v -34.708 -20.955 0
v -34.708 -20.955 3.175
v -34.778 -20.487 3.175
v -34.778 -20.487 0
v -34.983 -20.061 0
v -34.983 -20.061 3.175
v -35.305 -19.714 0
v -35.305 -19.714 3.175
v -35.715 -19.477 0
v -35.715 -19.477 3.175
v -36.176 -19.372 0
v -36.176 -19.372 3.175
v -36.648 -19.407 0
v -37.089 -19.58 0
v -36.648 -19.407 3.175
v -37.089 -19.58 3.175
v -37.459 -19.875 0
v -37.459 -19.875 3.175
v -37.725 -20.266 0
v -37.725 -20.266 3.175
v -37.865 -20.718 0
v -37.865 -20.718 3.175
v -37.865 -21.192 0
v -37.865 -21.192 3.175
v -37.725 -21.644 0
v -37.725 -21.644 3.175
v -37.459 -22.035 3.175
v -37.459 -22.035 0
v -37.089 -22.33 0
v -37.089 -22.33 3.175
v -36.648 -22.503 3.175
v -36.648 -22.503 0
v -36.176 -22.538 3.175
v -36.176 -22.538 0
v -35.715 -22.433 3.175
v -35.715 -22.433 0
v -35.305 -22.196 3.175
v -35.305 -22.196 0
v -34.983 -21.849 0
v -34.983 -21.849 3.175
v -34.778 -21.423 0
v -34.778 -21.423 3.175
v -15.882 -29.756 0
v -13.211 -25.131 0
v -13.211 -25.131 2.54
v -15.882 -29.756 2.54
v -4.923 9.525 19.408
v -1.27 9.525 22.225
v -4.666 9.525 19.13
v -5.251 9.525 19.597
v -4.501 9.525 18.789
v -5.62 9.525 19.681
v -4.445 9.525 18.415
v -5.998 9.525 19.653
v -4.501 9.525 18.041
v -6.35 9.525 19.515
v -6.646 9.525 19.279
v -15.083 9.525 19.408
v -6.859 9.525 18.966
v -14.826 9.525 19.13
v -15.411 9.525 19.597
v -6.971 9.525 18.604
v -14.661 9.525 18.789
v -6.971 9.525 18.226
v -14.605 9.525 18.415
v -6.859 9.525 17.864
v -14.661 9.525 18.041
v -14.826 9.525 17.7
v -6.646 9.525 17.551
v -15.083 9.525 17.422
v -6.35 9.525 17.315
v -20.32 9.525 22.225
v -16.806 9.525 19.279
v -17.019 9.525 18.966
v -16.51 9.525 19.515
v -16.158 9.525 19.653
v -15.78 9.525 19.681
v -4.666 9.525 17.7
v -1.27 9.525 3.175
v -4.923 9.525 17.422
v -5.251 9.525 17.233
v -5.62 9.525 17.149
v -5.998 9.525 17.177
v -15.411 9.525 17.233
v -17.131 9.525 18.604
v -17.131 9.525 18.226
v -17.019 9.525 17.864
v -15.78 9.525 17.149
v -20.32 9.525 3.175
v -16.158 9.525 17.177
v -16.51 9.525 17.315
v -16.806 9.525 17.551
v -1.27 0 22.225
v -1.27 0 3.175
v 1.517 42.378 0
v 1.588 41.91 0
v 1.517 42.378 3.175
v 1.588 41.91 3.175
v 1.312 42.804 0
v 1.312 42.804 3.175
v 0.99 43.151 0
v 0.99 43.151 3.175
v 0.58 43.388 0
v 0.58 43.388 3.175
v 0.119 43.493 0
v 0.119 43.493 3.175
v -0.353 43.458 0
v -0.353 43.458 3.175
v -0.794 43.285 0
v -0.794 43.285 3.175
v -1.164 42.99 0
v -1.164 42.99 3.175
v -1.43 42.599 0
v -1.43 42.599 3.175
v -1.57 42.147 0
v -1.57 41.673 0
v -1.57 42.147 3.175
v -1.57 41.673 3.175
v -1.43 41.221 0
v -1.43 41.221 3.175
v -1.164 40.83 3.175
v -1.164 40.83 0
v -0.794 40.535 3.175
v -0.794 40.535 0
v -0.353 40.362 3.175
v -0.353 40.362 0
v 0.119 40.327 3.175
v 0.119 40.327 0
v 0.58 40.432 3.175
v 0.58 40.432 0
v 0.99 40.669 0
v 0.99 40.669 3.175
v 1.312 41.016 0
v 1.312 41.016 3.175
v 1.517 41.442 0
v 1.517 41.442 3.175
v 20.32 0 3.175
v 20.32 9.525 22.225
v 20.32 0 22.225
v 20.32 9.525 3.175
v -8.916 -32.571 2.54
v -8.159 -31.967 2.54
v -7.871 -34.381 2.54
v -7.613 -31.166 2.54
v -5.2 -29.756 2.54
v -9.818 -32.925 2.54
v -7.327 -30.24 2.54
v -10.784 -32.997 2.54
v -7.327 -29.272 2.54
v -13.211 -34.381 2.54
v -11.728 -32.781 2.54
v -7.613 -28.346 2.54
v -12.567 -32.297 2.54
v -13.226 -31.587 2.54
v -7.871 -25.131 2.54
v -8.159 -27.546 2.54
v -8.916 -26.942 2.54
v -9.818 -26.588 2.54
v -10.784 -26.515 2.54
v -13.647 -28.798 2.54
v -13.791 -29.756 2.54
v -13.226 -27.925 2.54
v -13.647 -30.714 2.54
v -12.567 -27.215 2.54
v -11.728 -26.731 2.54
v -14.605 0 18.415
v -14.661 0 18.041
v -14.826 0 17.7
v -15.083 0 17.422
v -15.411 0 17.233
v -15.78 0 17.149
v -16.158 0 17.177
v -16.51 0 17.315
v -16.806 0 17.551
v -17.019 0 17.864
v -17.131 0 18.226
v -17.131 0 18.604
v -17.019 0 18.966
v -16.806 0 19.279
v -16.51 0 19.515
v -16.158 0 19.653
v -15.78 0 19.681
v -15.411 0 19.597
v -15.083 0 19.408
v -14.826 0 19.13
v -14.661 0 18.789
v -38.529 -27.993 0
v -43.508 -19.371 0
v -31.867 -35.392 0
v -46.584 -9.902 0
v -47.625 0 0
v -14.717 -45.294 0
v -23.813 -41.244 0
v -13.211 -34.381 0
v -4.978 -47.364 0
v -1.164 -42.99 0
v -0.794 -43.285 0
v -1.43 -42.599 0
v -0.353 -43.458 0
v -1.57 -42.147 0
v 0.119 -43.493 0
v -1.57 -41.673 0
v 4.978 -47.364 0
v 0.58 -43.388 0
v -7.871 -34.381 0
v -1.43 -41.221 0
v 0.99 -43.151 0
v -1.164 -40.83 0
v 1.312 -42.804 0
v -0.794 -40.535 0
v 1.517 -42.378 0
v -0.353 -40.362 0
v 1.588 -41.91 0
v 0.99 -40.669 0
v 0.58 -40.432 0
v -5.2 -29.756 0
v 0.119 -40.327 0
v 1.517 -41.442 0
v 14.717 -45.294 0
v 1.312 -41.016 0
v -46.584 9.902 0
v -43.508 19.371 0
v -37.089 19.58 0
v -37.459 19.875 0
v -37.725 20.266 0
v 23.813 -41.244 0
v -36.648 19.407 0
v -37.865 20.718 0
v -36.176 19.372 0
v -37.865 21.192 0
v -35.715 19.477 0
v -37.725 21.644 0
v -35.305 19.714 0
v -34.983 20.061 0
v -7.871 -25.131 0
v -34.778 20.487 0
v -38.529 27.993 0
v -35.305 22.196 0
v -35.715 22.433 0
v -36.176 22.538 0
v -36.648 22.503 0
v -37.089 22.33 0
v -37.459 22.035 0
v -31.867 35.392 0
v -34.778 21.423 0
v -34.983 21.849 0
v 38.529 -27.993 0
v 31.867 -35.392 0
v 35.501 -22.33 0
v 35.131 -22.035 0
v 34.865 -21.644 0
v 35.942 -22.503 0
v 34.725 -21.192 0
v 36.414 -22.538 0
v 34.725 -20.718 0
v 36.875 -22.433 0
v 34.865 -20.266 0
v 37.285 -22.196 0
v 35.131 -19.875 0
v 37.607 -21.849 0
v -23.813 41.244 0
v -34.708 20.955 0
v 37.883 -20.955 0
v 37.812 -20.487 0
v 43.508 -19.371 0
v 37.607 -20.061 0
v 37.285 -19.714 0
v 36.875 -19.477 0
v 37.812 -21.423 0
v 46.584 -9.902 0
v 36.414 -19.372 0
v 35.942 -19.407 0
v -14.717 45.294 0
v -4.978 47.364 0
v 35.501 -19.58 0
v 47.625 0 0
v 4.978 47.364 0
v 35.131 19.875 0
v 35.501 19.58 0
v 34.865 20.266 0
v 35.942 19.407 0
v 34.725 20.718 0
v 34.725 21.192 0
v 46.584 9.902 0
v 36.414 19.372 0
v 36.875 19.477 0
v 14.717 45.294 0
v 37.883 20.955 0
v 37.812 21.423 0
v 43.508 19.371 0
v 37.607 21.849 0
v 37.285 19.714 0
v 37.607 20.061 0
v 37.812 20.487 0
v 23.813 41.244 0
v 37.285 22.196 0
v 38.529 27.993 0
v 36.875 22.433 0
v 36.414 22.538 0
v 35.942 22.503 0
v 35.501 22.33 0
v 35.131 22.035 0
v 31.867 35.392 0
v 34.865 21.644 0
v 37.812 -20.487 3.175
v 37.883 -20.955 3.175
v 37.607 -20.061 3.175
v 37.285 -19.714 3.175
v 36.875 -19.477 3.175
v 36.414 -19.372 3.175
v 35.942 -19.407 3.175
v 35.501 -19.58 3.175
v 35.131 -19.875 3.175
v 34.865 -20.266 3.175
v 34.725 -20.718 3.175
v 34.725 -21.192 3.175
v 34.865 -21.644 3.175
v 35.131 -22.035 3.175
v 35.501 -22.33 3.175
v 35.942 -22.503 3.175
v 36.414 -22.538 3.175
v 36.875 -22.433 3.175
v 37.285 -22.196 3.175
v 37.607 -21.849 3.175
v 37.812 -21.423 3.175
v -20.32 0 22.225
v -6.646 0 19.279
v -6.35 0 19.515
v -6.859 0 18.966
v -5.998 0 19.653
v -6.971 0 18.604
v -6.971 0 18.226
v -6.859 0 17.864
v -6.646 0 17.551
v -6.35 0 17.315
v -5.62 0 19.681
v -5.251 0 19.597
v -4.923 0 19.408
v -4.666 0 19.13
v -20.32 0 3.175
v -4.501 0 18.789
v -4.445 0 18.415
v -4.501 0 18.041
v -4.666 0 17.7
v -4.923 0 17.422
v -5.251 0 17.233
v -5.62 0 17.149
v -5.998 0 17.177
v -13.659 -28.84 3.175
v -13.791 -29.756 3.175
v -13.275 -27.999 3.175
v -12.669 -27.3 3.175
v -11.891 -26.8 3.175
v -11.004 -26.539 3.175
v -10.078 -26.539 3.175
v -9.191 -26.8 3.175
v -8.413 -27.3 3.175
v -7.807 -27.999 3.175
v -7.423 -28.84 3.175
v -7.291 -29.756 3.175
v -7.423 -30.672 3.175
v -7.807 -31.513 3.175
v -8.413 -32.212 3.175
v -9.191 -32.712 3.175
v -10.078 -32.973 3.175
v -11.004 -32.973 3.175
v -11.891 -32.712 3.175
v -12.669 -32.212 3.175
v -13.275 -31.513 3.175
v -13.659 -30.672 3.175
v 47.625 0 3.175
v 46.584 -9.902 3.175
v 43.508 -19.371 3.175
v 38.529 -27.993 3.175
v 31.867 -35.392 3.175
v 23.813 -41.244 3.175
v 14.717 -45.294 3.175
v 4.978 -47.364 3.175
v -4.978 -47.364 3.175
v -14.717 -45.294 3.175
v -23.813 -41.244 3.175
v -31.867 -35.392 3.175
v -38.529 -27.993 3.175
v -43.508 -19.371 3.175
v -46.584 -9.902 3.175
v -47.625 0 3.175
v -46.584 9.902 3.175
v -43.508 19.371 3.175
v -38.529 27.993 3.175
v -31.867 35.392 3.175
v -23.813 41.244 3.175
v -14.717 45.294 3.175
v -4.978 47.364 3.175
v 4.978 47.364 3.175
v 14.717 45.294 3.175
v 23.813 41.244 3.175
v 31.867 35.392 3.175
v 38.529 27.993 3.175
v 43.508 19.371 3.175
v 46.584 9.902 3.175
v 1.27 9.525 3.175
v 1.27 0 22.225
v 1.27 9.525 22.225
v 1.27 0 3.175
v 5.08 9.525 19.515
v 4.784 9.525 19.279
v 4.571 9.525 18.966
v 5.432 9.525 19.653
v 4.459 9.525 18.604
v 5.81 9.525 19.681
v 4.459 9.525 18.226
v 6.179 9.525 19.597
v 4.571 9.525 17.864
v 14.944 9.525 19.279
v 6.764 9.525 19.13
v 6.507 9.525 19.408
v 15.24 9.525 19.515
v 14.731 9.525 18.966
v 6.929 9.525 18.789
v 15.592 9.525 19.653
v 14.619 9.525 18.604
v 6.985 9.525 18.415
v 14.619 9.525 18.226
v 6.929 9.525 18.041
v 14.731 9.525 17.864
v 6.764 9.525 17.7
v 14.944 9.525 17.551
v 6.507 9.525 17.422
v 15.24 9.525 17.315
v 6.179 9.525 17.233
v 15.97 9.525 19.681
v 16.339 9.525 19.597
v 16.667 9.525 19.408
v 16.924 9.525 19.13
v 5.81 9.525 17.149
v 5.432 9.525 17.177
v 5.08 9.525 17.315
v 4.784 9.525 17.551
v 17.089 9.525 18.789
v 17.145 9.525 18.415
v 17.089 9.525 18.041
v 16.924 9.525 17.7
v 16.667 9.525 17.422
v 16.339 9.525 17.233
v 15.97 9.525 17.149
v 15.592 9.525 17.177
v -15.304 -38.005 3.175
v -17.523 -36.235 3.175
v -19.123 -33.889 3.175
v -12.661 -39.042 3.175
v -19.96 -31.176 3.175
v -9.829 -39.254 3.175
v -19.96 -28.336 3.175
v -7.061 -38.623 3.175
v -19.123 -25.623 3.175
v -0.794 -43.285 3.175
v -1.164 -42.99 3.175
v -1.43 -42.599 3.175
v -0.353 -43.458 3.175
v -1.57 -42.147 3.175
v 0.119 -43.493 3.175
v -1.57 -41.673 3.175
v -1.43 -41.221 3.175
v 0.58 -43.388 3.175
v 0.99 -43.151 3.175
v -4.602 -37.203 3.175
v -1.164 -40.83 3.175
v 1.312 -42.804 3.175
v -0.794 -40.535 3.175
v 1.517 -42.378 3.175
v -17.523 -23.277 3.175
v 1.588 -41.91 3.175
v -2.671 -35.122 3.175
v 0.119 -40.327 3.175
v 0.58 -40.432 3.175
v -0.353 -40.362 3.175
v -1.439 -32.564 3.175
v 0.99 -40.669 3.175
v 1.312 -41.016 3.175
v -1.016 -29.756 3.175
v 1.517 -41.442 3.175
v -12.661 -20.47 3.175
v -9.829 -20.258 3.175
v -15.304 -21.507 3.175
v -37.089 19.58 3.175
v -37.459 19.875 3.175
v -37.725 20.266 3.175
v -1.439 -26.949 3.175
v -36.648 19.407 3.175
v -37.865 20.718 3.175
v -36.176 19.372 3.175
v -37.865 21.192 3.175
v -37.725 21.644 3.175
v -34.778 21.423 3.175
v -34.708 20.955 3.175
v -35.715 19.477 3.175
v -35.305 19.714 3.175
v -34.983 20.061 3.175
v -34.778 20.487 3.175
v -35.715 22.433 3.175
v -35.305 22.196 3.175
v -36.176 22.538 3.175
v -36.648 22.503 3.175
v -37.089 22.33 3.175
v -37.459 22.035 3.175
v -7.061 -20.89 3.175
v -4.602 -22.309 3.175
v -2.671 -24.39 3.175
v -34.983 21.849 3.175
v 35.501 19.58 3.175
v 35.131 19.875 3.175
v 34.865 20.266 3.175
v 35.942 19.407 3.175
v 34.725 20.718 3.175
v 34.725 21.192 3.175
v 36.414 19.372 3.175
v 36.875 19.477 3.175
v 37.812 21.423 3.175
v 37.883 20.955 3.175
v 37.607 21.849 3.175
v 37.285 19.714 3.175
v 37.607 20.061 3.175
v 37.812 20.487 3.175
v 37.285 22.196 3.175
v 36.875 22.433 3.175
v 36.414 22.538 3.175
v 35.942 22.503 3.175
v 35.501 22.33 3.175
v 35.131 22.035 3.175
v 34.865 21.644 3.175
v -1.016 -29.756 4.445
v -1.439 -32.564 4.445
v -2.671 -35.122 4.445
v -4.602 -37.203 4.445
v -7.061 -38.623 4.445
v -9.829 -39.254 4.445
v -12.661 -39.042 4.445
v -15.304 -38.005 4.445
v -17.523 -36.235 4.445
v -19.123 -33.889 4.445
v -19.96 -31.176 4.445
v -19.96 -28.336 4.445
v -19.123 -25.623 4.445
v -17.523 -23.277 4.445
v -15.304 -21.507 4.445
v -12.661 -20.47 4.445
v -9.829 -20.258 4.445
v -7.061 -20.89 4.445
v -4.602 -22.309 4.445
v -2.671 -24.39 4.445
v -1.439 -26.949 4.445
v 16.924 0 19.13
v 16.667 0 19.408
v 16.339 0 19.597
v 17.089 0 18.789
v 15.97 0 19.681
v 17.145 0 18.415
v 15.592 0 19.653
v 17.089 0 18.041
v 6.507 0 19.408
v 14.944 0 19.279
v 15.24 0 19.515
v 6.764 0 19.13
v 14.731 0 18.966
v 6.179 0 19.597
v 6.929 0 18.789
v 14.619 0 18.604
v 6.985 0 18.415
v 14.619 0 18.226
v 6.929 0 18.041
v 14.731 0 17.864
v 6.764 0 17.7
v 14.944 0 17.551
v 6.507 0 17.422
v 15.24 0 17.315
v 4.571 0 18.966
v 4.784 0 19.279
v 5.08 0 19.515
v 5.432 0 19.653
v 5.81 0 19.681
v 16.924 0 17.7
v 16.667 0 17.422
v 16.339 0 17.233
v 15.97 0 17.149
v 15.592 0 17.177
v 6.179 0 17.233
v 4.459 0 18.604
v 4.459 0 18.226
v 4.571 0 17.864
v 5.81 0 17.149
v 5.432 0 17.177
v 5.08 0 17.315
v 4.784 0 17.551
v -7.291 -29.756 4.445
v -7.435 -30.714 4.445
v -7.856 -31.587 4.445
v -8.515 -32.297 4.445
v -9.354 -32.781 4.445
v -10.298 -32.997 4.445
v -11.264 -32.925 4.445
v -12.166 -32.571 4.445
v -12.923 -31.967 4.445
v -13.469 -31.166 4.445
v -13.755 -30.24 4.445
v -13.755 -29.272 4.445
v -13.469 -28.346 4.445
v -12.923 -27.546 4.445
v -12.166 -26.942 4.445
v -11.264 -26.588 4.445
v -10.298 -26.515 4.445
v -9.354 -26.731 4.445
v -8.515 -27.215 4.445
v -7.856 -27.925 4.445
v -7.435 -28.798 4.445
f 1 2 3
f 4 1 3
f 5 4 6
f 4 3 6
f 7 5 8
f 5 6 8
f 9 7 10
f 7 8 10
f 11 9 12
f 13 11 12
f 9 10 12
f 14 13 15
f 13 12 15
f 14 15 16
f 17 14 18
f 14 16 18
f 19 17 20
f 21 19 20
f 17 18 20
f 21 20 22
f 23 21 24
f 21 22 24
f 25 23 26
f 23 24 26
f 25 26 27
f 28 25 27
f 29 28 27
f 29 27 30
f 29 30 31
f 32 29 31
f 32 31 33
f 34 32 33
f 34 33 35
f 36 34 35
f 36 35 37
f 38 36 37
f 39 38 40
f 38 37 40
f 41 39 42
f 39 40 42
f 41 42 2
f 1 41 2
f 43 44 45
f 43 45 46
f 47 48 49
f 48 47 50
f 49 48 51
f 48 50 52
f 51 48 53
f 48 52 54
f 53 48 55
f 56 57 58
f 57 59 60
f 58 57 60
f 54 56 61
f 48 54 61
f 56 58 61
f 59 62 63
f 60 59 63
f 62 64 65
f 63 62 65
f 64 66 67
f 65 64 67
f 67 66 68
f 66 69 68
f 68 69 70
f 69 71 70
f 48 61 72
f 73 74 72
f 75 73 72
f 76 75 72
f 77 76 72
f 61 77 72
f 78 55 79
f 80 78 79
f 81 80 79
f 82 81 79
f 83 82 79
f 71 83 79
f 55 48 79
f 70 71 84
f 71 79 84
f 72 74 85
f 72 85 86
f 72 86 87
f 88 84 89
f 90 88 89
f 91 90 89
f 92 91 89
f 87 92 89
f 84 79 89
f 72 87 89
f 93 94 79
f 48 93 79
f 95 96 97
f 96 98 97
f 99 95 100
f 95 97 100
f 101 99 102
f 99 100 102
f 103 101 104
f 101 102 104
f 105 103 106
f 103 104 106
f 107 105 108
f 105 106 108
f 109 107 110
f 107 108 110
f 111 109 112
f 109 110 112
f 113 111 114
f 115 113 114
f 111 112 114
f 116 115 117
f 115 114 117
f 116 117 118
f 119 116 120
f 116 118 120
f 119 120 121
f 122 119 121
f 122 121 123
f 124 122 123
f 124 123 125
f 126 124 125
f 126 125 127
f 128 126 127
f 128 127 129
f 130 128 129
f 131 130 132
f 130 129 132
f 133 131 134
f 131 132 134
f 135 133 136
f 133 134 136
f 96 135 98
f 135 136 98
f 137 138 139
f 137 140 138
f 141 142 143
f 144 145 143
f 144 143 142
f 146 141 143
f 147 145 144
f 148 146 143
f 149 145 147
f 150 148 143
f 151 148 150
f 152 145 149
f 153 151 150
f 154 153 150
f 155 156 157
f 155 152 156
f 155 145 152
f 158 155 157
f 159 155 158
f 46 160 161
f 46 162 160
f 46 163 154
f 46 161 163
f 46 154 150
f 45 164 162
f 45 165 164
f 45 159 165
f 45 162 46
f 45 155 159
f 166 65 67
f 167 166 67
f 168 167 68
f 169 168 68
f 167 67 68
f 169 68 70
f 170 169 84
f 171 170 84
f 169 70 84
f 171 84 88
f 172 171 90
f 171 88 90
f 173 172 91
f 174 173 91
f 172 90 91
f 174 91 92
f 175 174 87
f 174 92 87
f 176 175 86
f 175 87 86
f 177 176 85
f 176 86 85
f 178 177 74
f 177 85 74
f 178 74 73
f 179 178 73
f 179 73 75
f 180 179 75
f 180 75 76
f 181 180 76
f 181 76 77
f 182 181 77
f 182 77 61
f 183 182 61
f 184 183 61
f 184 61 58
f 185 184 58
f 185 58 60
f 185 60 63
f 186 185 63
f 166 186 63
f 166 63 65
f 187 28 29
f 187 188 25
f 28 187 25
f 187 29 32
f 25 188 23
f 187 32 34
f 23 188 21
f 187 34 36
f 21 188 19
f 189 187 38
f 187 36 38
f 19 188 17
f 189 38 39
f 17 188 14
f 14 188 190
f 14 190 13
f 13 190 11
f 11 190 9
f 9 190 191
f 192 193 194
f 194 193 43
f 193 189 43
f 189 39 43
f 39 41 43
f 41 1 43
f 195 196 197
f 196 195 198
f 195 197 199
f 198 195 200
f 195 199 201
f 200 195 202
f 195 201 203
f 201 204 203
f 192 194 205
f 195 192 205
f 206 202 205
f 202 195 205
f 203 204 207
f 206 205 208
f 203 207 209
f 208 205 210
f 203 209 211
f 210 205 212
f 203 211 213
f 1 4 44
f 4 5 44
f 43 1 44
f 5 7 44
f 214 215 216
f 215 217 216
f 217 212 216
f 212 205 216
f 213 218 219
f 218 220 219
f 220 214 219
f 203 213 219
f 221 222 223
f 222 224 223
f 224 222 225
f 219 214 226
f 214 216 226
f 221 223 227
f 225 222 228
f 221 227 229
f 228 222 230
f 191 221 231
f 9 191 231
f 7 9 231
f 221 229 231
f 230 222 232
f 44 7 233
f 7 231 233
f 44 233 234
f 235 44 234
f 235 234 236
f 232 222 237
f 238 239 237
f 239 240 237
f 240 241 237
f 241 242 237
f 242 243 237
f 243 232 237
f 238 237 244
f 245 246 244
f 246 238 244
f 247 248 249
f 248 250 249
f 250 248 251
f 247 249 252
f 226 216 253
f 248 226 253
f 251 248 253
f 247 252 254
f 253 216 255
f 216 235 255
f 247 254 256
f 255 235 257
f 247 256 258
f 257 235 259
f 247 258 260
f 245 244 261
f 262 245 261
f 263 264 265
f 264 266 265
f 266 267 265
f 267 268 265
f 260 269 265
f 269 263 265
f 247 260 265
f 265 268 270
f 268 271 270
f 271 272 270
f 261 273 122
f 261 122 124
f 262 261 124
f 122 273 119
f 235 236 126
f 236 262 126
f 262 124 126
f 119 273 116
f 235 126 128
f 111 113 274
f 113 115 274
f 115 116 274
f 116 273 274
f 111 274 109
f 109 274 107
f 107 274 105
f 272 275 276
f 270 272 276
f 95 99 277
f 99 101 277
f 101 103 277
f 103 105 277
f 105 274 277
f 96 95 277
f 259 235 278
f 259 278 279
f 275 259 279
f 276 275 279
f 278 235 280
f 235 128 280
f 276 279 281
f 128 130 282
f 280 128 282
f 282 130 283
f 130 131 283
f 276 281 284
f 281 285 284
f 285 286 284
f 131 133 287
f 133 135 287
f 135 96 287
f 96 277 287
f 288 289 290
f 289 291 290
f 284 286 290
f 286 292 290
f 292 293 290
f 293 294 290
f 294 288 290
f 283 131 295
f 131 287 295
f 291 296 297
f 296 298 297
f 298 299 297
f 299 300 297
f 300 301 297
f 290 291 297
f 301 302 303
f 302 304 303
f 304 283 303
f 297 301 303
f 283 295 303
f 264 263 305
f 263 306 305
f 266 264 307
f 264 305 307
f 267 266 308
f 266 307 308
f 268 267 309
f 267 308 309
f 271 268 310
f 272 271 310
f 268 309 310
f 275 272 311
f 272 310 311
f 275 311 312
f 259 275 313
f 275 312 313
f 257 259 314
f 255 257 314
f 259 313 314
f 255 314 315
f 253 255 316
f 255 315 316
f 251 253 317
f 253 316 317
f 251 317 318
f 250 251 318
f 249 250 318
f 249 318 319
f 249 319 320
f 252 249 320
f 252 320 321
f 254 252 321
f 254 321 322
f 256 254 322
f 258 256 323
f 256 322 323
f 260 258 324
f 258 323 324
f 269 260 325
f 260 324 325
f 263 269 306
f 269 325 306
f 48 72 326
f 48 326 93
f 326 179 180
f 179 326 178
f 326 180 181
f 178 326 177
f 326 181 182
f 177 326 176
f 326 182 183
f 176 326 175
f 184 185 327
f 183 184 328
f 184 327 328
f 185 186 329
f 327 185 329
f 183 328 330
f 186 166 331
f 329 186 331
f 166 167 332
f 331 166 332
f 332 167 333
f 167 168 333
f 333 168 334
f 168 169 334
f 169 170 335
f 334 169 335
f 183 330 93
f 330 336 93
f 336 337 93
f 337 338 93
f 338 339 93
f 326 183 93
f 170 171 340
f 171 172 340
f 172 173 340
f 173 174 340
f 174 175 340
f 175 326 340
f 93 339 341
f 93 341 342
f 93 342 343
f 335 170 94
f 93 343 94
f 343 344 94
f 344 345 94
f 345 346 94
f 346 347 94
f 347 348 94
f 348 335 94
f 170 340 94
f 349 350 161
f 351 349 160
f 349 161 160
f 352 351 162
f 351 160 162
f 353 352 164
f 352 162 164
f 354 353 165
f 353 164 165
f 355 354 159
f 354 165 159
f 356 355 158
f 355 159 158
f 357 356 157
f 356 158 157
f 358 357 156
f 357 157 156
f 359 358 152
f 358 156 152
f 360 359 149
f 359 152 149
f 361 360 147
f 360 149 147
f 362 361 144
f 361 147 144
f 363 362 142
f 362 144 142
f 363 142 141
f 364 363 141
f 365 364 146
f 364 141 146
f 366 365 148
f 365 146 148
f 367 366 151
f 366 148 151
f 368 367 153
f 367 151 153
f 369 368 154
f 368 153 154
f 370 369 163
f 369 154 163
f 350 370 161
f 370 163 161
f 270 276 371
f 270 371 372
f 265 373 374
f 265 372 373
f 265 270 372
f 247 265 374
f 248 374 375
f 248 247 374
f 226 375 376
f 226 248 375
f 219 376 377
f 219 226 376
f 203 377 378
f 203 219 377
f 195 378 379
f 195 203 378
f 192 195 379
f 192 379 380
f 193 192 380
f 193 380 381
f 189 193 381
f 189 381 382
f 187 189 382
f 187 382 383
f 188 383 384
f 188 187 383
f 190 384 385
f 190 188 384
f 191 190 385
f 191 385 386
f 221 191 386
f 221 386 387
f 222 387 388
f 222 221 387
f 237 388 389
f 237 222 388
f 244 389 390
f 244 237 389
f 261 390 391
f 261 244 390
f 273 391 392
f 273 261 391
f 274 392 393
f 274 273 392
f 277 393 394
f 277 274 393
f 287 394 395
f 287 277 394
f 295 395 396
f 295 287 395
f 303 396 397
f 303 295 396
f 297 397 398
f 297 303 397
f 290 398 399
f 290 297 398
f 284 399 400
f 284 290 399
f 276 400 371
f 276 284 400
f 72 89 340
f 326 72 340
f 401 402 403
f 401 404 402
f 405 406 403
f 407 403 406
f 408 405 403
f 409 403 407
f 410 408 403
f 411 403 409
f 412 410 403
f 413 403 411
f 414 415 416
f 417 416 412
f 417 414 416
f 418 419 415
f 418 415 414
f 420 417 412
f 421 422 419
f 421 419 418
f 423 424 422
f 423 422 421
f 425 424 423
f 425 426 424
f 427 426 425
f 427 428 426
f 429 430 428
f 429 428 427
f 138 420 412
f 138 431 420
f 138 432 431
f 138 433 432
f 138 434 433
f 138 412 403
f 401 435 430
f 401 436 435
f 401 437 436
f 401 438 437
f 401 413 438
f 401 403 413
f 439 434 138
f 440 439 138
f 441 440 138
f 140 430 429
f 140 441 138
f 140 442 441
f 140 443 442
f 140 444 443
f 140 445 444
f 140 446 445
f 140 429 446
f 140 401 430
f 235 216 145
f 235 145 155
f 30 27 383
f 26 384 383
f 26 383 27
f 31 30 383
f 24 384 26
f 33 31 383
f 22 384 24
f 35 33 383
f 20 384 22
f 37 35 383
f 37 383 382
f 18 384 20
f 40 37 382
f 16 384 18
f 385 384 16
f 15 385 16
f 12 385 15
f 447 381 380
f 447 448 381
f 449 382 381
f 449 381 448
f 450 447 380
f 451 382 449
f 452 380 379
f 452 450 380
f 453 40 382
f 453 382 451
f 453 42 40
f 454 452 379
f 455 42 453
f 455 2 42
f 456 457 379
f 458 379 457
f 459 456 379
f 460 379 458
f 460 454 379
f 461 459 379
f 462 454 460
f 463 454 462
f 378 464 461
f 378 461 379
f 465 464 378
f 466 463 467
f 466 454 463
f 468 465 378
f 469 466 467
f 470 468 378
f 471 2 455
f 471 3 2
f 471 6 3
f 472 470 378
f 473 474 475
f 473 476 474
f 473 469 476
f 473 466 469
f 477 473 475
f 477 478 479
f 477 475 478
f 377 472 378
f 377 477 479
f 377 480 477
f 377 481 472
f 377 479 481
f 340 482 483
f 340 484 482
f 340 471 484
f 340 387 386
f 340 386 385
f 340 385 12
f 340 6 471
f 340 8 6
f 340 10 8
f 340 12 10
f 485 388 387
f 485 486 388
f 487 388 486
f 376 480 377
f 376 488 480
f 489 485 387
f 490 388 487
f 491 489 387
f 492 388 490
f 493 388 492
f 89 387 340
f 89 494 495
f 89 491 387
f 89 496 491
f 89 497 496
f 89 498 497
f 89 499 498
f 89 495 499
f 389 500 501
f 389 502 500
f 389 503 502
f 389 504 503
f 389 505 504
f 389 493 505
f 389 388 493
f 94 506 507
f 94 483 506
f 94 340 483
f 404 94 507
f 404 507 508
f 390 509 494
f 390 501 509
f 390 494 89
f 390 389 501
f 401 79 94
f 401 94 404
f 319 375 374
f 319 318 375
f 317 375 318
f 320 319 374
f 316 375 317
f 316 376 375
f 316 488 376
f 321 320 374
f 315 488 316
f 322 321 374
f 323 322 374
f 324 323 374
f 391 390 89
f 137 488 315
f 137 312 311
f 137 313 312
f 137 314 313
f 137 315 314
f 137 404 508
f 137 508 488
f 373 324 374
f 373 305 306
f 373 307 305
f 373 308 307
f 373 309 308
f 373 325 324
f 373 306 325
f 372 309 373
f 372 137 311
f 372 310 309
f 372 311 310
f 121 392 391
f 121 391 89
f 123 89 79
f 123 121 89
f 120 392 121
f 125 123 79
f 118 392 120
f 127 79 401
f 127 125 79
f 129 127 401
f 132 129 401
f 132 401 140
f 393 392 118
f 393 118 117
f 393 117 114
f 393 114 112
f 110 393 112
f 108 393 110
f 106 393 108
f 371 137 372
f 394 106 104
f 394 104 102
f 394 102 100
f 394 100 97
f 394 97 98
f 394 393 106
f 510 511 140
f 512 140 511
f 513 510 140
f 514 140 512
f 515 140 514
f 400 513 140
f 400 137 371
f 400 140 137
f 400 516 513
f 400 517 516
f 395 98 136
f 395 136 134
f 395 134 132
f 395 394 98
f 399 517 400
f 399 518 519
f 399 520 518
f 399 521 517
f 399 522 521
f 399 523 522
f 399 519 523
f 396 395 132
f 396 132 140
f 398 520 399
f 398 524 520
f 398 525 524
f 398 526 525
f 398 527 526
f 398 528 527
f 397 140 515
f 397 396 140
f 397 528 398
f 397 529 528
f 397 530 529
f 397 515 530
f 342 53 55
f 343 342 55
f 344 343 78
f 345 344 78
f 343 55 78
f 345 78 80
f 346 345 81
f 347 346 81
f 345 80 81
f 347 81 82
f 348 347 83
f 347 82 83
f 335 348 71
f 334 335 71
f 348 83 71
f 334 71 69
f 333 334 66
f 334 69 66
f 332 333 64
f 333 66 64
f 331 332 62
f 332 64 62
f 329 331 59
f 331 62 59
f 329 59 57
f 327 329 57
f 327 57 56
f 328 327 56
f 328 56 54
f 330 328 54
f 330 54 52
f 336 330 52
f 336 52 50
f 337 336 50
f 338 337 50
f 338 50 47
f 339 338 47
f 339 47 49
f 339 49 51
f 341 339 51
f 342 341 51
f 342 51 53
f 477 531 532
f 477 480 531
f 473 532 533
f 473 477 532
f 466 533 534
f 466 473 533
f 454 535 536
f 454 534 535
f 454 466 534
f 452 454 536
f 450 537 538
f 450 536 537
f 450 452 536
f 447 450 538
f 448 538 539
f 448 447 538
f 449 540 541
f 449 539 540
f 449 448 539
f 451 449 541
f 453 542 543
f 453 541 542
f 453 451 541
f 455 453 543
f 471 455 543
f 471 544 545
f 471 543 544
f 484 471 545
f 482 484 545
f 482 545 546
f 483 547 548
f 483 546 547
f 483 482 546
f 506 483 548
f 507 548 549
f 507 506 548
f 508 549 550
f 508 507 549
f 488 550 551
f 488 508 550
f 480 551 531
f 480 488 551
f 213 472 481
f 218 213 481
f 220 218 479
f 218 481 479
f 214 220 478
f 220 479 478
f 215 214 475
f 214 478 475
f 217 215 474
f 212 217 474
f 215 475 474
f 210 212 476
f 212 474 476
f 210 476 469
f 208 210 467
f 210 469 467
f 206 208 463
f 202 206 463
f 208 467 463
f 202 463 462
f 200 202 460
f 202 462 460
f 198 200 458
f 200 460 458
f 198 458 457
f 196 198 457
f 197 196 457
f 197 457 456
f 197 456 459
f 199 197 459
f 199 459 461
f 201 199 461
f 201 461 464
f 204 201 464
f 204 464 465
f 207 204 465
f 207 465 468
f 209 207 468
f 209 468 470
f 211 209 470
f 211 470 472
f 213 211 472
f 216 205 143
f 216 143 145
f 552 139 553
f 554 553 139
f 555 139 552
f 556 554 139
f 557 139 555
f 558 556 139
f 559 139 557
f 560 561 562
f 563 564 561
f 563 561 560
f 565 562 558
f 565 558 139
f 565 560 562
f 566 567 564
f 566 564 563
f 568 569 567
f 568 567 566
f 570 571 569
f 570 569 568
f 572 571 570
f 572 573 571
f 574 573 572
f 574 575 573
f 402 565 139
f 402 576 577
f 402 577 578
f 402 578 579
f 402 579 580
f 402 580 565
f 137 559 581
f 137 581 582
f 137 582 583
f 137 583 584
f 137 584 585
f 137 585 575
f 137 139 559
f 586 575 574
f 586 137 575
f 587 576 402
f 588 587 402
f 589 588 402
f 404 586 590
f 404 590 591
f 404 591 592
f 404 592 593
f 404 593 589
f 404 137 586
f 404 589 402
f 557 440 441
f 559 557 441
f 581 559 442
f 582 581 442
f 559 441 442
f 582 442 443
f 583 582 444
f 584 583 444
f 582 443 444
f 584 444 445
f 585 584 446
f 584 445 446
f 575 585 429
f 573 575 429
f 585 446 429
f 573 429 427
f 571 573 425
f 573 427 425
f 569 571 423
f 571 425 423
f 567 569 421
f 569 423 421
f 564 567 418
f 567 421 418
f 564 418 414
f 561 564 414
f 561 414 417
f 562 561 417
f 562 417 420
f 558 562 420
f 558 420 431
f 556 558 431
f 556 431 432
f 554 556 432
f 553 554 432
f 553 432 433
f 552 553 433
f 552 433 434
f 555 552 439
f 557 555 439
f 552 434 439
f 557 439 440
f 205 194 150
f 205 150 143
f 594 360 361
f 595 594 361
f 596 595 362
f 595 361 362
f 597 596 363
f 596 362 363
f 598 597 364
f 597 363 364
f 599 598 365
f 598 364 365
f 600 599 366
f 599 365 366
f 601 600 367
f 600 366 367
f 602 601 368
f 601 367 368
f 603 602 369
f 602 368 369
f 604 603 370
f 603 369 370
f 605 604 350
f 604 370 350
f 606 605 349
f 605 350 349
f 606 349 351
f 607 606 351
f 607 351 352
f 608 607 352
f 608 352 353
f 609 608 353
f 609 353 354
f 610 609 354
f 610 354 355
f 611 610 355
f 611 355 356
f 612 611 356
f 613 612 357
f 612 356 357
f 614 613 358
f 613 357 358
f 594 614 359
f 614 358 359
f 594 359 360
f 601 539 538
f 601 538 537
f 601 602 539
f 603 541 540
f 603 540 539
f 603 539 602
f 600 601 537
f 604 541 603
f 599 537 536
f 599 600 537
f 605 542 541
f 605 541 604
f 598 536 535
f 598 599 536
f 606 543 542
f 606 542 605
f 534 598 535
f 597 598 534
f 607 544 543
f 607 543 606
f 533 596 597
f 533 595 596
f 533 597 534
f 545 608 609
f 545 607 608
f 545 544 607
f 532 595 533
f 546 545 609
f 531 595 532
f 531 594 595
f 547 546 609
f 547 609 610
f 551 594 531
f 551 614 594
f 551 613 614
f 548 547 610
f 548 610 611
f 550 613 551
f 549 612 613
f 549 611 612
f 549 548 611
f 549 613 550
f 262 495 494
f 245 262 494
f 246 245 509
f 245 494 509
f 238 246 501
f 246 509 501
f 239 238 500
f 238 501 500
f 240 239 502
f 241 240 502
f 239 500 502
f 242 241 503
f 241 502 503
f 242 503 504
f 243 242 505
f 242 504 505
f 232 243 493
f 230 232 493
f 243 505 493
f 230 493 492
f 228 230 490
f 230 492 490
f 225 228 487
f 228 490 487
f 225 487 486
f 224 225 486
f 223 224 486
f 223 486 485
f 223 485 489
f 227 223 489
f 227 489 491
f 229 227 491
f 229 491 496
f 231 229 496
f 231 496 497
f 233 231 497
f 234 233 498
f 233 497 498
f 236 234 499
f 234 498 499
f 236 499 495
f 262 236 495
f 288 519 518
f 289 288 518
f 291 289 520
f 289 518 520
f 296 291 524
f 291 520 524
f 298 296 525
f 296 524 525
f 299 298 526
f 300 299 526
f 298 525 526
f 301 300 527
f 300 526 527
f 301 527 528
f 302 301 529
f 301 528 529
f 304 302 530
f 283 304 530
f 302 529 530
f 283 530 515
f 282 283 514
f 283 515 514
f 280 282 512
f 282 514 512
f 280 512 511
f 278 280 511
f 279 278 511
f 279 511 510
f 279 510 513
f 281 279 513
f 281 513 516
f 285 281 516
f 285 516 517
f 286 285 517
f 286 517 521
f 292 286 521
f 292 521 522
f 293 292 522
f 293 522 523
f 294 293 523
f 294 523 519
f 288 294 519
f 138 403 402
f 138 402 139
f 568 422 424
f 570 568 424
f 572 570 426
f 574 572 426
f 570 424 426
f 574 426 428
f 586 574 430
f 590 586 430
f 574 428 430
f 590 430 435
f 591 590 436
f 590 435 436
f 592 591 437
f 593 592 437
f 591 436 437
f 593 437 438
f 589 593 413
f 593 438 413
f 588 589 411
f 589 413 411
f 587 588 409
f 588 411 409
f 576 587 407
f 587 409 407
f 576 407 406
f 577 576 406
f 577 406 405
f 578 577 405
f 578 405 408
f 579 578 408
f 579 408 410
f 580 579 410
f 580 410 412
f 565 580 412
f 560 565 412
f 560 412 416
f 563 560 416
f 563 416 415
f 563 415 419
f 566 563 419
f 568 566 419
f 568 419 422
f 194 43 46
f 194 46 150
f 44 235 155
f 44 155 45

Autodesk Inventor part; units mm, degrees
ref_plane "YZ Plane" through (0, 0, 0) normal (1, 0, 0) x (0, 1, 0)
ref_plane "XZ Plane" through (0, 0, 0) normal (0, 1, 0) x (-1, 0, 0)
ref_plane "XY Plane" through (0, 0, 0) normal (0, 0, 1) x (1, 0, 0)
sketch "Sketch1" plane through (0, 0, 0) normal (0, 0, 1) x (1, 0, 0)
  circle A0 centre (0, 0) radius 47.625
  dimension "d0" = 95.25
extrude "Extrusion1" add sketch "Sketch1" along normal blind 3.175
sketch "Sketch3" plane through (0, 0, 3.175) normal (0, 0, 1) x (1, 0, 0)
  line L0 (1.27, 9.525) -> (20.32, 9.525)
  line L1 (20.32, 9.525) -> (20.32, 0)
  line L2 (20.32, 0) -> (1.27, 0)
  line L3 (1.27, 0) -> (1.27, 9.525)
  line L4 (0, 0) -> (0, -11.0035)
  line L5 (-1.27, 9.525) -> (-20.32, 9.525)
  line L6 (-20.32, 9.525) -> (-20.32, 0)
  line L7 (-20.32, 0) -> (-1.27, 0)
  line L8 (-1.27, 0) -> (-1.27, 9.525)
  dimension "d11" = 19.05
  dimension "d12" = 9.525
  dimension "d13" = 1.27
  dimension "d14" = 0
extrude "Extrusion3" add sketch "Sketch3" along normal blind 19.05
sketch "Sketch4" plane through (1.27, 9.525, 3.175) normal (0, 1, 0) x (1, 0, 0)
  circle A0 centre (4.445, -15.24) radius 1.27
  line L0 (19.05, -19.05) -> (0, -19.05) projected
  circle A1 centre (14.605, -15.24) radius 1.27
  line L1 (9.525, -19.05) -> (9.525, -7.9119)
  line L2 (-1.27, 3.175) -> (-1.27, 8.3959)
  circle A2 centre (-6.985, -15.24) radius 1.27
  circle A3 centre (-17.145, -15.24) radius 1.27
  dimension "d17" = 2.54
  dimension "d18" = 3.81
  dimension "d19" = 2.54
  dimension "d20" = 3.81
  dimension "d21" = 10.16
  dimension "d22" = 5.08
extrude "Extrusion4" cut sketch "Sketch4" against normal through all
sketch "Sketch5" plane through (0, 0, 0) normal (0, 0, -1) x (-1, 0, 0)
  circle A0 centre (10.541, -29.7561) radius 3.25
  point P0 (0, 0)
  dimension "d25" = 6.5
  dimension "d26" = 10.541
  dimension "d27" = 29.7561
extrude "Extrusion5" cut sketch "Sketch5" against normal blind 25.4
sketch "Sketch6" plane through (0, 0, 3.175) normal (0, 0, 1) x (1, 0, 0)
  circle A0 centre (-10.541, -29.7561) radius 3.25 projected
  circle A1 centre (0, 0) radius 47.625 projected
  circle A2 centre (-10.541, -29.7561) radius 9.525
  dimension "d30" = 19.05
extrude "Extrusion6" add sketch "Sketch6" along normal blind 1.27 contours A2
sketch "Sketch7" plane through (0, 0, 0) normal (0, 0, -1) x (-1, 0, 0)
  circle A0 centre (10.541, -29.7561) radius 3.25 projected
  circle A1 centre (0, 0) radius 47.625 projected
  line L0 (5.2005, -29.7561) -> (7.8708, -25.1311)
  line L1 (7.8708, -25.1311) -> (13.2112, -25.1311)
  line L2 (13.2112, -25.1311) -> (15.8815, -29.7561)
  line L3 (15.8815, -29.7561) -> (13.2112, -34.3811)
  line L4 (13.2112, -34.3811) -> (7.8708, -34.3811)
  line L5 (7.8708, -34.3811) -> (5.2005, -29.7561)
  dimension "d33" = 9.25
extrude "Extrusion7" cut sketch "Sketch7" against normal blind 2.54 contours L0 L1 L2 L3 L4 L5
sketch "Sketch8" plane through (0, 0, 3.175) normal (0, 0, 1) x (1, 0, 0)
  line L0 (0, 0) -> (0, 41.91)
  circle A0 centre (0, 41.91) radius 1.5875
  circle A1 centre (-36.2951, 20.955) radius 1.5875
  circle A2 centre (-36.2951, -20.955) radius 1.5875
  circle A3 centre (0, -41.91) radius 1.5875
  circle A4 centre (36.2951, -20.955) radius 1.5875
  circle A5 centre (36.2951, 20.955) radius 1.5875
  dimension "d36" = 41.91
  dimension "d37" = 3.175
  dimension "d40" = 360
extrude "Extrusion8" cut sketch "Sketch8" against normal blind 25.4
properties part number "frontServoAttachmentPlate" material "ABS Plastic"
